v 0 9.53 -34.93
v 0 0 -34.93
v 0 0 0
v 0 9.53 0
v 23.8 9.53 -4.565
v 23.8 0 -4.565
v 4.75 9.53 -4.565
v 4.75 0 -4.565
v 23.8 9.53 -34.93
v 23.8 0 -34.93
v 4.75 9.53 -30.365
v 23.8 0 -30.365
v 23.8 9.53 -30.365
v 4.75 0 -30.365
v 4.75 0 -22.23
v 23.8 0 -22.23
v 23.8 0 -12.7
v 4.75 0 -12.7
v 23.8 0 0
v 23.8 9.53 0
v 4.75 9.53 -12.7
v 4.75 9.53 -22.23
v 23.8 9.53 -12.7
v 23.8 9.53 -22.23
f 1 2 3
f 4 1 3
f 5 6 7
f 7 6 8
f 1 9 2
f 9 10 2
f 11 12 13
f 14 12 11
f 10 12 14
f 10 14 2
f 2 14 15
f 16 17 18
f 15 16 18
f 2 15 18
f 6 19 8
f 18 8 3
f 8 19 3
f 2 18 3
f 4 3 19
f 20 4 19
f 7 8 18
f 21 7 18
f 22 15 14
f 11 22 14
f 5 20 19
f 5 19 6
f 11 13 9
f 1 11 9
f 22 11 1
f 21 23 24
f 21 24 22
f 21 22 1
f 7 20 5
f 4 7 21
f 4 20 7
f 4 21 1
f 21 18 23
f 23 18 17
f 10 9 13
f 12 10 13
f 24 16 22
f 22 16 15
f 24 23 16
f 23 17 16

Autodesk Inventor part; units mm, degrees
ref_plane "YZ Plane" through (0, 0, 0) normal (1, 0, 0) x (0, 1, 0)
sketch "Sketch1" plane through (0, 0, 0) normal (0, 1, 0) x (-1, 0, 0)
  line L0 (0, 0) -> (-4.75, 0)
  line L1 (-4.75, 0) -> (-4.75, -34.93)
  line L2 (-4.75, -34.93) -> (0, -34.93)
  line L3 (0, -34.93) -> (0, 0)
  line L4 (-4.75, 0) -> (-23.8, 0)
  line L5 (-23.8, 0) -> (-23.8, -4.565)
  line L6 (-23.8, -4.565) -> (-4.75, -4.565)
  line L7 (-4.75, -4.565) -> (-4.75, 0)
  line L8 (-4.75, -12.7) -> (-23.8, -12.7)
  line L9 (-23.8, -12.7) -> (-23.8, -22.23)
  line L10 (-23.8, -22.23) -> (-4.75, -22.23)
  line L11 (-4.75, -22.23) -> (-4.75, -12.7)
  line L12 (-4.75, -34.93) -> (-23.8, -34.93)
  line L13 (-23.8, -34.93) -> (-23.8, -30.365)
  line L14 (-23.8, -30.365) -> (-4.75, -30.365)
  line L15 (-4.75, -30.365) -> (-4.75, -34.93)
  line L16 (0, -17.465) -> (-23.9272, -17.465) construction
  point P0 (-23.8, -17.465)
  dimension "d0" = 34.93
  dimension "d1" = 9.53
  dimension "d2" = 25.8
  dimension "d3" = 12.9
  dimension "d4" = 19.05
  dimension "d5" = 23.8
extrude "Extrusion1" add sketch "Sketch1" along normal blind 9.53
ref_plane "Work Plane2" through (0, 0, -17.465) normal (0, 0, 1) x (1, 0, 0)
ref_plane "Work Plane3" through (0, 4.765, 0) normal (0, -1, 0) x (1, 0, 0)
equation "\"d3\" = 0.5 * d2"
properties part number "TSC_EL375" material "Iron, Gray"
